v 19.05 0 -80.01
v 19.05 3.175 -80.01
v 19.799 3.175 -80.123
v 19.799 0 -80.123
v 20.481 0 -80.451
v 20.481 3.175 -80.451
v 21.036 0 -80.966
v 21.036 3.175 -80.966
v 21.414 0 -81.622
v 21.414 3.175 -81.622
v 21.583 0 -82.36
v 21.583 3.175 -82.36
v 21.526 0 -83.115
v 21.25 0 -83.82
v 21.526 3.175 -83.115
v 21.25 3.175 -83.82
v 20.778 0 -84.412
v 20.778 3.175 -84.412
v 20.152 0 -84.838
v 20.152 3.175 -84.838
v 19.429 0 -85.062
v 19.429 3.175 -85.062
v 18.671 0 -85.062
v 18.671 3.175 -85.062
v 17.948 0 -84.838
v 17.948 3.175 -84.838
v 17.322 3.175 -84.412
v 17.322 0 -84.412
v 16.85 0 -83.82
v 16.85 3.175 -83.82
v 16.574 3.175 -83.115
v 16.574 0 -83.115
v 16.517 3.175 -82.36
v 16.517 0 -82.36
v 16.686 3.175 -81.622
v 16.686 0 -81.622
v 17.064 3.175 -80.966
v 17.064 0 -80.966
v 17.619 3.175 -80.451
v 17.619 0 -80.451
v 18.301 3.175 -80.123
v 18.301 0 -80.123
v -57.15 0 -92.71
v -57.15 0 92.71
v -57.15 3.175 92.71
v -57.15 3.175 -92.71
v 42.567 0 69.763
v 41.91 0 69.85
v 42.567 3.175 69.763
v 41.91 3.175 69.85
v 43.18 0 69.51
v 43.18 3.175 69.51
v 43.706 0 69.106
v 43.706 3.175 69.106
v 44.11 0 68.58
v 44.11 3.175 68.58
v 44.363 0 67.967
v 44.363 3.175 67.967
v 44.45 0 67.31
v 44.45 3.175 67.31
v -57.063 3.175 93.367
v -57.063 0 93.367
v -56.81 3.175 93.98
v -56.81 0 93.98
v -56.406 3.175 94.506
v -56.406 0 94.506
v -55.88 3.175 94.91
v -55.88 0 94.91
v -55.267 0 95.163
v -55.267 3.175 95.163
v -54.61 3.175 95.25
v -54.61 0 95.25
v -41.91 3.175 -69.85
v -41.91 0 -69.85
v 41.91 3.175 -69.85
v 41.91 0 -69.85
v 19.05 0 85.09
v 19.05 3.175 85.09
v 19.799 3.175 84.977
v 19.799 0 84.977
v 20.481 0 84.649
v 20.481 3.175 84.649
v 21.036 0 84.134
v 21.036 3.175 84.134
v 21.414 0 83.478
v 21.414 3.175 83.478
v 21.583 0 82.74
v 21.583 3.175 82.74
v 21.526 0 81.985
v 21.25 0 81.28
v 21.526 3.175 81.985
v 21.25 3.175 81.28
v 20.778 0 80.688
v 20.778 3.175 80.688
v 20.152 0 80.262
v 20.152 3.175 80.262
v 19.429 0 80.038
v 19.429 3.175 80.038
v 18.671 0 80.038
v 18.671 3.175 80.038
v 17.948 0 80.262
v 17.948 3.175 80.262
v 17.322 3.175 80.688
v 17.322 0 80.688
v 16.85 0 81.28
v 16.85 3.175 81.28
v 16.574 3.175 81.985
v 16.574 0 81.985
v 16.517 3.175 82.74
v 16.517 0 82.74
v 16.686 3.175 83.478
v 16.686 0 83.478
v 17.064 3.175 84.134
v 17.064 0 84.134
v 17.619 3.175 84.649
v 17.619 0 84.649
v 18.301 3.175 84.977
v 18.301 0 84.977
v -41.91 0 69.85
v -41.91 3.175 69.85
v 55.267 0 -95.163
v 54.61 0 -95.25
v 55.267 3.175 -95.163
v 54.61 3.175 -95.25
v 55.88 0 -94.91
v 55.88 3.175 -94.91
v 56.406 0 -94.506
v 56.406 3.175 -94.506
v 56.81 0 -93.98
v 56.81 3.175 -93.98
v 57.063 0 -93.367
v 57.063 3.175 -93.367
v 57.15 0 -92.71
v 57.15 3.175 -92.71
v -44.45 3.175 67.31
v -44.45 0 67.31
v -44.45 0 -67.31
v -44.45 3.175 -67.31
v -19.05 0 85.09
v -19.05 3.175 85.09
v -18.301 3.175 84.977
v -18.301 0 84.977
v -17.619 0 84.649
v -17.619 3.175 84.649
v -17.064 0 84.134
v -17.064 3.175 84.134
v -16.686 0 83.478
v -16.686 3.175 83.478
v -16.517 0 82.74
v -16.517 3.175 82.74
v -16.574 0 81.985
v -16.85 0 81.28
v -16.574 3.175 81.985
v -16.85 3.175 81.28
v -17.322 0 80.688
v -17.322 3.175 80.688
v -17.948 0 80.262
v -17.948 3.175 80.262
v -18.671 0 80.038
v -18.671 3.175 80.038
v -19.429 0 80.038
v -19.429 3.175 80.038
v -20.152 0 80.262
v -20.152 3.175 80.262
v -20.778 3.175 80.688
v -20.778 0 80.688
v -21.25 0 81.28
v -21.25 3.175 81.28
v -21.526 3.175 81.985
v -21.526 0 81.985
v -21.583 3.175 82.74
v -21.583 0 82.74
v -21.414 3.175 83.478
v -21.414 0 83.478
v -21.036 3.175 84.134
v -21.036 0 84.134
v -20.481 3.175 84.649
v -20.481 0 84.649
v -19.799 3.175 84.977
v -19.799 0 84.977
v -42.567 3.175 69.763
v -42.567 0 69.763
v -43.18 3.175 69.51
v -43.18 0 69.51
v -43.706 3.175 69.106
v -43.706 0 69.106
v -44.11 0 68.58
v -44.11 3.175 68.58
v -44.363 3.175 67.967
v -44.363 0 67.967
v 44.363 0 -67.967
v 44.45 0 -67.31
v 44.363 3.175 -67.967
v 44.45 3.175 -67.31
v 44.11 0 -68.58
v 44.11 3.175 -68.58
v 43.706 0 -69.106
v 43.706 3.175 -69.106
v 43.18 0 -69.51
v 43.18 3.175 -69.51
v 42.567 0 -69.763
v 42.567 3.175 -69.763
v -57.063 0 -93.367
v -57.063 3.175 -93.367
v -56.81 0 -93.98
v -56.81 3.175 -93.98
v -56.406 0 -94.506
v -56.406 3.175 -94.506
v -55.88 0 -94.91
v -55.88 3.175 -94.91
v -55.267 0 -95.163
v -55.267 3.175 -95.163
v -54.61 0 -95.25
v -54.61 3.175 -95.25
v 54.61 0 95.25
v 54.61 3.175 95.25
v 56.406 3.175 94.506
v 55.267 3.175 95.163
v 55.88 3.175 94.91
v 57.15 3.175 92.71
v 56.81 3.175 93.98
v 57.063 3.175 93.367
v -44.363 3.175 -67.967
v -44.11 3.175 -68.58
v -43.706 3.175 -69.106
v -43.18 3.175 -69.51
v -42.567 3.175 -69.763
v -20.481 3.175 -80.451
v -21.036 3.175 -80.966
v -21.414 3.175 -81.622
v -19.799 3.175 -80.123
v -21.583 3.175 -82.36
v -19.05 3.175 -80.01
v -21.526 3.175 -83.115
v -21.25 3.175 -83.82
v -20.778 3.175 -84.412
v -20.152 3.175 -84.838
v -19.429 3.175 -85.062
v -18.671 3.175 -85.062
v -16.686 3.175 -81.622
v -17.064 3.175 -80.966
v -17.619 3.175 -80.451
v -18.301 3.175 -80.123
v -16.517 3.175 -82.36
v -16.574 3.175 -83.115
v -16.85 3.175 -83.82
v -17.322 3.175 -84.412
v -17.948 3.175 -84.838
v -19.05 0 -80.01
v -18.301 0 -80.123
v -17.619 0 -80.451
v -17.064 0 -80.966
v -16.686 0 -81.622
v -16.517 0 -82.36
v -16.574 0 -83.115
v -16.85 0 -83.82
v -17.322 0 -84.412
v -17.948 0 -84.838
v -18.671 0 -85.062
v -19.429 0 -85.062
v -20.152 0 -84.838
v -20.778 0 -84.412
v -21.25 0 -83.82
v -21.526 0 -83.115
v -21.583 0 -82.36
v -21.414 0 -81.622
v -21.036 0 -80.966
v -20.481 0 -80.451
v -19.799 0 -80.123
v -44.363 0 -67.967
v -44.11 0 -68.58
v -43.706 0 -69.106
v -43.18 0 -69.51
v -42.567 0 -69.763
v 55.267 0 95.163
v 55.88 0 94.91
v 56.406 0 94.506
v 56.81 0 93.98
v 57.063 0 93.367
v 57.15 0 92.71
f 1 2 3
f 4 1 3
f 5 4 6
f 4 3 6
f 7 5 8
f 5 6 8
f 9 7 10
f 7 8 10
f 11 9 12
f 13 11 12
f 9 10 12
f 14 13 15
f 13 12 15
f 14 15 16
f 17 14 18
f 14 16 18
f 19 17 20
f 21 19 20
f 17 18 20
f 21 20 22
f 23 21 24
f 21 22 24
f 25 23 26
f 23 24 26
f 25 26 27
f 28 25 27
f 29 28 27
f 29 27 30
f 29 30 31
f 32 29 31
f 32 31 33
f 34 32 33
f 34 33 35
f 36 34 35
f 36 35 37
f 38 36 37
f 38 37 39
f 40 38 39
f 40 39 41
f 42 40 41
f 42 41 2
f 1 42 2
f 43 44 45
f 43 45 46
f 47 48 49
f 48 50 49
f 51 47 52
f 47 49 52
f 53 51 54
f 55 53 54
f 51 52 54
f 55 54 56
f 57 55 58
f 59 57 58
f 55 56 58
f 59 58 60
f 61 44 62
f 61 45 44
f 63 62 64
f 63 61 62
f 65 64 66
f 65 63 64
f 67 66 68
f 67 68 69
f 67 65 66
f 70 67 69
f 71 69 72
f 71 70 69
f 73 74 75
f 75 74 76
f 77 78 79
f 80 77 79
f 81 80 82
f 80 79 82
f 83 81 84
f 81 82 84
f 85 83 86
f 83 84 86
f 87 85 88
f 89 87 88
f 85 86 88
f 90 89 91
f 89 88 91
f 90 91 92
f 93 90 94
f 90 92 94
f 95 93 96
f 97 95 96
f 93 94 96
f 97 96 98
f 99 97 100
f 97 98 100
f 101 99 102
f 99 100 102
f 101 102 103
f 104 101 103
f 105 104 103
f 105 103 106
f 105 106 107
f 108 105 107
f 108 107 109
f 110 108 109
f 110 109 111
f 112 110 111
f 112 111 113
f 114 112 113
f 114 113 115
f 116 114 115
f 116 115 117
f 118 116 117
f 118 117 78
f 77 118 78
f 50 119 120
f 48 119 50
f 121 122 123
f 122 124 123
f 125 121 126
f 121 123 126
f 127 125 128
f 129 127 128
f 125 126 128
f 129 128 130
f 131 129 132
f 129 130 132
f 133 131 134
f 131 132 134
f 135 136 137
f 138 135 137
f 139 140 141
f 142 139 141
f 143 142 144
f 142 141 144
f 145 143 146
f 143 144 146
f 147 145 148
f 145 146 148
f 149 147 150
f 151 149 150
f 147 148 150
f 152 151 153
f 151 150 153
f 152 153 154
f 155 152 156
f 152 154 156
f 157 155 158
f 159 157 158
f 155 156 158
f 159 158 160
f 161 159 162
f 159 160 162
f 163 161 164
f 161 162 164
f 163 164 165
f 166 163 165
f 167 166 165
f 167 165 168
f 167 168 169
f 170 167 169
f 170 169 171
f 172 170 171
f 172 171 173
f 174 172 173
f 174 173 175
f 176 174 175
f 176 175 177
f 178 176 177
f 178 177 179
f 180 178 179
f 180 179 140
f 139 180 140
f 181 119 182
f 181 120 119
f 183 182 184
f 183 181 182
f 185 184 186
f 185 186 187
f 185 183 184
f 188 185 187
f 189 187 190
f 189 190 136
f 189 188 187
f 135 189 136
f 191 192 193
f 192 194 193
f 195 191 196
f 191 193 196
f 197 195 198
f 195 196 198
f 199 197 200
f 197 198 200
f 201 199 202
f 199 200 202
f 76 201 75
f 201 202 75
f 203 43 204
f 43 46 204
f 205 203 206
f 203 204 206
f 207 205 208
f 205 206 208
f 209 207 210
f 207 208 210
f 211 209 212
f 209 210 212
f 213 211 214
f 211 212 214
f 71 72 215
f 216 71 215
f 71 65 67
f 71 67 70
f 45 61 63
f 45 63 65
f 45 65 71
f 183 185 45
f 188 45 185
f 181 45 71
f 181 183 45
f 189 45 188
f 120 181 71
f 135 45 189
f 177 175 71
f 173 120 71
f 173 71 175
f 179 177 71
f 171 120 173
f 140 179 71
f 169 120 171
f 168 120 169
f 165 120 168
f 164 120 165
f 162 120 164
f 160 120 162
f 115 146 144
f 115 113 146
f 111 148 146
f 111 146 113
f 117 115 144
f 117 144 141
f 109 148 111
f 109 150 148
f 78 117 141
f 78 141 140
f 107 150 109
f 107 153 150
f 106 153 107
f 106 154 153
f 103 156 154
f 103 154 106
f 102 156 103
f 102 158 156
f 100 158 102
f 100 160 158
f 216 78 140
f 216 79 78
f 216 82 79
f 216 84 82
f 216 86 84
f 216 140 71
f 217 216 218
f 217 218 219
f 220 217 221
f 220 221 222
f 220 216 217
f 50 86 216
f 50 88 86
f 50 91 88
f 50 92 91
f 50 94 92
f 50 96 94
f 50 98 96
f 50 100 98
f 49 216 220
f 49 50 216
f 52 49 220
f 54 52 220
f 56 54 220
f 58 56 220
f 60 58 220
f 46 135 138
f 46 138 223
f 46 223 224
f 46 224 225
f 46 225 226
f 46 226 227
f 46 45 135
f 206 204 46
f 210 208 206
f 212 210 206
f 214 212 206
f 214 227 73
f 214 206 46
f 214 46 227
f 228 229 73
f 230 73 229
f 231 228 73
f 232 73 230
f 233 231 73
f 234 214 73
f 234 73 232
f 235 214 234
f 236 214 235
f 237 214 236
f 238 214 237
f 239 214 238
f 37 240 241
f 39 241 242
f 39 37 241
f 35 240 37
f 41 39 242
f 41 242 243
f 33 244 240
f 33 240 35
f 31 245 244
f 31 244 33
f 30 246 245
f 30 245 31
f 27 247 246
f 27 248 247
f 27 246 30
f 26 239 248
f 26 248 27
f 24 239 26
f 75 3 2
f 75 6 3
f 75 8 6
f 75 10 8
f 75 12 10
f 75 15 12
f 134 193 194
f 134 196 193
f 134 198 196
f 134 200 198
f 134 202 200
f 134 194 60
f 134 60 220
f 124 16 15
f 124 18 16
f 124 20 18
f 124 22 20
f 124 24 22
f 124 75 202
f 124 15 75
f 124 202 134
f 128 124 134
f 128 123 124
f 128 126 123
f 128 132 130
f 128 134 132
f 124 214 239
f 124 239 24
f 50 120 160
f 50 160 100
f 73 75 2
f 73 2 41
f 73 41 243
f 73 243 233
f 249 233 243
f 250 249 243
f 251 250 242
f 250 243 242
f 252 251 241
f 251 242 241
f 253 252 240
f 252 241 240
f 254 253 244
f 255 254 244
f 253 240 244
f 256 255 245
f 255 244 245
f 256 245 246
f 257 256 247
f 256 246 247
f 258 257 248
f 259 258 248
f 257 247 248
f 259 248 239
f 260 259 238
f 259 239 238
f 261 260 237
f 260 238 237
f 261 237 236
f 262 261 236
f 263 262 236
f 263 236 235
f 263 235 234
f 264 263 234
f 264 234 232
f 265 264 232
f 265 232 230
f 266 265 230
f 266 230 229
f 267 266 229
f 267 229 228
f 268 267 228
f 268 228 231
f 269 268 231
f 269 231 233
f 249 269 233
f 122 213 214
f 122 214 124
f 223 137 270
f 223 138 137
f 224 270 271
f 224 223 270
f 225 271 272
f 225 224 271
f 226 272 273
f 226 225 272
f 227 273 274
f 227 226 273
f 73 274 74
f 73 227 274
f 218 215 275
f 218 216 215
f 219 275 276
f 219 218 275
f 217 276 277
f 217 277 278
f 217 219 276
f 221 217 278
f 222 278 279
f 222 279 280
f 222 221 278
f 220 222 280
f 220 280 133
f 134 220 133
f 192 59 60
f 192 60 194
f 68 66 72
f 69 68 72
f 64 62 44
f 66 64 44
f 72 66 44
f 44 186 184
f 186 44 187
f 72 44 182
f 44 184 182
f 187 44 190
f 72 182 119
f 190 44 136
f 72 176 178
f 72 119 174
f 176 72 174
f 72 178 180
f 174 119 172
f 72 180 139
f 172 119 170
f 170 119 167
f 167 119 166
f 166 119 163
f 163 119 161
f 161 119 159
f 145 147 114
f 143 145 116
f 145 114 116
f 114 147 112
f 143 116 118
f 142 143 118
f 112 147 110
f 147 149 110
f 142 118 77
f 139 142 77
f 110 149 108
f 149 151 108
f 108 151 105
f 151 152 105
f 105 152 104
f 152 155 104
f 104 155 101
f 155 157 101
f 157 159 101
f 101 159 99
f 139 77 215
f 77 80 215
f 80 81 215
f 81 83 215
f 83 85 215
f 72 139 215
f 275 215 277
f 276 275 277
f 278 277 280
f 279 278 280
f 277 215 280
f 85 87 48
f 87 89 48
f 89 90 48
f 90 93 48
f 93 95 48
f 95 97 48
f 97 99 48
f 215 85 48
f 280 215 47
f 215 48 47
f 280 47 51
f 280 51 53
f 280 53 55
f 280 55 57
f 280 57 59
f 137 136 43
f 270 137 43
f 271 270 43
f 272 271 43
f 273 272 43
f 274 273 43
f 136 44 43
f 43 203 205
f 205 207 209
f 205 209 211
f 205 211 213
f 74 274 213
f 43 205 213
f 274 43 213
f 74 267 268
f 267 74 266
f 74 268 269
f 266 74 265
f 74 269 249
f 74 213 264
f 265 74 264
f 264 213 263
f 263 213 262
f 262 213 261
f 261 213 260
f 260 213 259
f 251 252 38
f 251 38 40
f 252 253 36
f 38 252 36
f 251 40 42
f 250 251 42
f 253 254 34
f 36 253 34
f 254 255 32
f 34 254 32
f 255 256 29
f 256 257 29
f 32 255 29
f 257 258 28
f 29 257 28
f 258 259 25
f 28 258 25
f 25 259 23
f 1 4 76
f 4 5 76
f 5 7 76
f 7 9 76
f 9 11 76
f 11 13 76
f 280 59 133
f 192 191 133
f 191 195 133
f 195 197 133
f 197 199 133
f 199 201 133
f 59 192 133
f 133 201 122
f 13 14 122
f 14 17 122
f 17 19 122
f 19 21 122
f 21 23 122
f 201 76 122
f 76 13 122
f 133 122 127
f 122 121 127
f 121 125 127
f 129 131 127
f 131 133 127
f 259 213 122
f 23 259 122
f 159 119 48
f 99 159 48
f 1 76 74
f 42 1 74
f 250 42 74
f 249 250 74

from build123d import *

# Parameters (mm, degrees)
SKETCH1_W           = 114.3
SKETCH1_H           = 190.5
SKETCH1_W_2         = 88.9
SKETCH1_H_2         = 139.7
BOSS_EXTRUDE1_DEPTH = 3.175
SKETCH2_R           = 2.54
CUT_EXTRUDE1_DEPTH  = 4.7625
FILLET1_R           = 2.54
FILLET2_R           = 2.54


with BuildPart() as part:
    # Sketch1 → Boss-Extrude1 (new body)
    with BuildSketch(Plane(origin=(0, 0, 0), x_dir=(1, 0, 0), z_dir=(0, 1, 0))):
        Rectangle(SKETCH1_W, SKETCH1_H)
        Rectangle(SKETCH1_W_2, SKETCH1_H_2, mode=Mode.SUBTRACT)
    extrude(amount=BOSS_EXTRUDE1_DEPTH)

    # Sketch2 → Cut-Extrude1 (cut)
    with BuildSketch(Plane(origin=(0, 3.175, 0), x_dir=(1, 0, 0), z_dir=(0, 1, 0))):
        with Locations(Location((19.05, -82.55, 0), (0, 0, 270))):
            Circle(SKETCH2_R)
        with Locations(Location((19.05, 82.55, 0), (0, 0, 270))):
            Circle(SKETCH2_R)
        with Locations(Location((-19.05, -82.55, 0), (0, 0, 270))):
            Circle(SKETCH2_R)
        with Locations(Location((-19.05, 82.55, 0), (0, 0, 270))):
            Circle(SKETCH2_R)
    extrude(amount=-CUT_EXTRUDE1_DEPTH, mode=Mode.SUBTRACT)

    # Fillet1
    fillet1_edges = [part.edges().sort_by_distance(p)[0] for p in [
        (-44.45, 1.5875, -69.85),
        (-44.45, 1.5875, 69.85),
        (44.45, 1.5875, 69.85),
        (44.45, 1.5875, -69.85),
    ]]
    fillet(fillet1_edges, radius=FILLET1_R)

    # Fillet2
    fillet2_edges = [part.edges().sort_by_distance(p)[0] for p in [
        (-57.15, 1.5875, -95.25),
        (57.15, 1.5875, -95.25),
        (57.15, 1.5875, 95.25),
        (-57.15, 1.5875, 95.25),
    ]]
    fillet(fillet2_edges, radius=FILLET2_R)


solid = part.part
